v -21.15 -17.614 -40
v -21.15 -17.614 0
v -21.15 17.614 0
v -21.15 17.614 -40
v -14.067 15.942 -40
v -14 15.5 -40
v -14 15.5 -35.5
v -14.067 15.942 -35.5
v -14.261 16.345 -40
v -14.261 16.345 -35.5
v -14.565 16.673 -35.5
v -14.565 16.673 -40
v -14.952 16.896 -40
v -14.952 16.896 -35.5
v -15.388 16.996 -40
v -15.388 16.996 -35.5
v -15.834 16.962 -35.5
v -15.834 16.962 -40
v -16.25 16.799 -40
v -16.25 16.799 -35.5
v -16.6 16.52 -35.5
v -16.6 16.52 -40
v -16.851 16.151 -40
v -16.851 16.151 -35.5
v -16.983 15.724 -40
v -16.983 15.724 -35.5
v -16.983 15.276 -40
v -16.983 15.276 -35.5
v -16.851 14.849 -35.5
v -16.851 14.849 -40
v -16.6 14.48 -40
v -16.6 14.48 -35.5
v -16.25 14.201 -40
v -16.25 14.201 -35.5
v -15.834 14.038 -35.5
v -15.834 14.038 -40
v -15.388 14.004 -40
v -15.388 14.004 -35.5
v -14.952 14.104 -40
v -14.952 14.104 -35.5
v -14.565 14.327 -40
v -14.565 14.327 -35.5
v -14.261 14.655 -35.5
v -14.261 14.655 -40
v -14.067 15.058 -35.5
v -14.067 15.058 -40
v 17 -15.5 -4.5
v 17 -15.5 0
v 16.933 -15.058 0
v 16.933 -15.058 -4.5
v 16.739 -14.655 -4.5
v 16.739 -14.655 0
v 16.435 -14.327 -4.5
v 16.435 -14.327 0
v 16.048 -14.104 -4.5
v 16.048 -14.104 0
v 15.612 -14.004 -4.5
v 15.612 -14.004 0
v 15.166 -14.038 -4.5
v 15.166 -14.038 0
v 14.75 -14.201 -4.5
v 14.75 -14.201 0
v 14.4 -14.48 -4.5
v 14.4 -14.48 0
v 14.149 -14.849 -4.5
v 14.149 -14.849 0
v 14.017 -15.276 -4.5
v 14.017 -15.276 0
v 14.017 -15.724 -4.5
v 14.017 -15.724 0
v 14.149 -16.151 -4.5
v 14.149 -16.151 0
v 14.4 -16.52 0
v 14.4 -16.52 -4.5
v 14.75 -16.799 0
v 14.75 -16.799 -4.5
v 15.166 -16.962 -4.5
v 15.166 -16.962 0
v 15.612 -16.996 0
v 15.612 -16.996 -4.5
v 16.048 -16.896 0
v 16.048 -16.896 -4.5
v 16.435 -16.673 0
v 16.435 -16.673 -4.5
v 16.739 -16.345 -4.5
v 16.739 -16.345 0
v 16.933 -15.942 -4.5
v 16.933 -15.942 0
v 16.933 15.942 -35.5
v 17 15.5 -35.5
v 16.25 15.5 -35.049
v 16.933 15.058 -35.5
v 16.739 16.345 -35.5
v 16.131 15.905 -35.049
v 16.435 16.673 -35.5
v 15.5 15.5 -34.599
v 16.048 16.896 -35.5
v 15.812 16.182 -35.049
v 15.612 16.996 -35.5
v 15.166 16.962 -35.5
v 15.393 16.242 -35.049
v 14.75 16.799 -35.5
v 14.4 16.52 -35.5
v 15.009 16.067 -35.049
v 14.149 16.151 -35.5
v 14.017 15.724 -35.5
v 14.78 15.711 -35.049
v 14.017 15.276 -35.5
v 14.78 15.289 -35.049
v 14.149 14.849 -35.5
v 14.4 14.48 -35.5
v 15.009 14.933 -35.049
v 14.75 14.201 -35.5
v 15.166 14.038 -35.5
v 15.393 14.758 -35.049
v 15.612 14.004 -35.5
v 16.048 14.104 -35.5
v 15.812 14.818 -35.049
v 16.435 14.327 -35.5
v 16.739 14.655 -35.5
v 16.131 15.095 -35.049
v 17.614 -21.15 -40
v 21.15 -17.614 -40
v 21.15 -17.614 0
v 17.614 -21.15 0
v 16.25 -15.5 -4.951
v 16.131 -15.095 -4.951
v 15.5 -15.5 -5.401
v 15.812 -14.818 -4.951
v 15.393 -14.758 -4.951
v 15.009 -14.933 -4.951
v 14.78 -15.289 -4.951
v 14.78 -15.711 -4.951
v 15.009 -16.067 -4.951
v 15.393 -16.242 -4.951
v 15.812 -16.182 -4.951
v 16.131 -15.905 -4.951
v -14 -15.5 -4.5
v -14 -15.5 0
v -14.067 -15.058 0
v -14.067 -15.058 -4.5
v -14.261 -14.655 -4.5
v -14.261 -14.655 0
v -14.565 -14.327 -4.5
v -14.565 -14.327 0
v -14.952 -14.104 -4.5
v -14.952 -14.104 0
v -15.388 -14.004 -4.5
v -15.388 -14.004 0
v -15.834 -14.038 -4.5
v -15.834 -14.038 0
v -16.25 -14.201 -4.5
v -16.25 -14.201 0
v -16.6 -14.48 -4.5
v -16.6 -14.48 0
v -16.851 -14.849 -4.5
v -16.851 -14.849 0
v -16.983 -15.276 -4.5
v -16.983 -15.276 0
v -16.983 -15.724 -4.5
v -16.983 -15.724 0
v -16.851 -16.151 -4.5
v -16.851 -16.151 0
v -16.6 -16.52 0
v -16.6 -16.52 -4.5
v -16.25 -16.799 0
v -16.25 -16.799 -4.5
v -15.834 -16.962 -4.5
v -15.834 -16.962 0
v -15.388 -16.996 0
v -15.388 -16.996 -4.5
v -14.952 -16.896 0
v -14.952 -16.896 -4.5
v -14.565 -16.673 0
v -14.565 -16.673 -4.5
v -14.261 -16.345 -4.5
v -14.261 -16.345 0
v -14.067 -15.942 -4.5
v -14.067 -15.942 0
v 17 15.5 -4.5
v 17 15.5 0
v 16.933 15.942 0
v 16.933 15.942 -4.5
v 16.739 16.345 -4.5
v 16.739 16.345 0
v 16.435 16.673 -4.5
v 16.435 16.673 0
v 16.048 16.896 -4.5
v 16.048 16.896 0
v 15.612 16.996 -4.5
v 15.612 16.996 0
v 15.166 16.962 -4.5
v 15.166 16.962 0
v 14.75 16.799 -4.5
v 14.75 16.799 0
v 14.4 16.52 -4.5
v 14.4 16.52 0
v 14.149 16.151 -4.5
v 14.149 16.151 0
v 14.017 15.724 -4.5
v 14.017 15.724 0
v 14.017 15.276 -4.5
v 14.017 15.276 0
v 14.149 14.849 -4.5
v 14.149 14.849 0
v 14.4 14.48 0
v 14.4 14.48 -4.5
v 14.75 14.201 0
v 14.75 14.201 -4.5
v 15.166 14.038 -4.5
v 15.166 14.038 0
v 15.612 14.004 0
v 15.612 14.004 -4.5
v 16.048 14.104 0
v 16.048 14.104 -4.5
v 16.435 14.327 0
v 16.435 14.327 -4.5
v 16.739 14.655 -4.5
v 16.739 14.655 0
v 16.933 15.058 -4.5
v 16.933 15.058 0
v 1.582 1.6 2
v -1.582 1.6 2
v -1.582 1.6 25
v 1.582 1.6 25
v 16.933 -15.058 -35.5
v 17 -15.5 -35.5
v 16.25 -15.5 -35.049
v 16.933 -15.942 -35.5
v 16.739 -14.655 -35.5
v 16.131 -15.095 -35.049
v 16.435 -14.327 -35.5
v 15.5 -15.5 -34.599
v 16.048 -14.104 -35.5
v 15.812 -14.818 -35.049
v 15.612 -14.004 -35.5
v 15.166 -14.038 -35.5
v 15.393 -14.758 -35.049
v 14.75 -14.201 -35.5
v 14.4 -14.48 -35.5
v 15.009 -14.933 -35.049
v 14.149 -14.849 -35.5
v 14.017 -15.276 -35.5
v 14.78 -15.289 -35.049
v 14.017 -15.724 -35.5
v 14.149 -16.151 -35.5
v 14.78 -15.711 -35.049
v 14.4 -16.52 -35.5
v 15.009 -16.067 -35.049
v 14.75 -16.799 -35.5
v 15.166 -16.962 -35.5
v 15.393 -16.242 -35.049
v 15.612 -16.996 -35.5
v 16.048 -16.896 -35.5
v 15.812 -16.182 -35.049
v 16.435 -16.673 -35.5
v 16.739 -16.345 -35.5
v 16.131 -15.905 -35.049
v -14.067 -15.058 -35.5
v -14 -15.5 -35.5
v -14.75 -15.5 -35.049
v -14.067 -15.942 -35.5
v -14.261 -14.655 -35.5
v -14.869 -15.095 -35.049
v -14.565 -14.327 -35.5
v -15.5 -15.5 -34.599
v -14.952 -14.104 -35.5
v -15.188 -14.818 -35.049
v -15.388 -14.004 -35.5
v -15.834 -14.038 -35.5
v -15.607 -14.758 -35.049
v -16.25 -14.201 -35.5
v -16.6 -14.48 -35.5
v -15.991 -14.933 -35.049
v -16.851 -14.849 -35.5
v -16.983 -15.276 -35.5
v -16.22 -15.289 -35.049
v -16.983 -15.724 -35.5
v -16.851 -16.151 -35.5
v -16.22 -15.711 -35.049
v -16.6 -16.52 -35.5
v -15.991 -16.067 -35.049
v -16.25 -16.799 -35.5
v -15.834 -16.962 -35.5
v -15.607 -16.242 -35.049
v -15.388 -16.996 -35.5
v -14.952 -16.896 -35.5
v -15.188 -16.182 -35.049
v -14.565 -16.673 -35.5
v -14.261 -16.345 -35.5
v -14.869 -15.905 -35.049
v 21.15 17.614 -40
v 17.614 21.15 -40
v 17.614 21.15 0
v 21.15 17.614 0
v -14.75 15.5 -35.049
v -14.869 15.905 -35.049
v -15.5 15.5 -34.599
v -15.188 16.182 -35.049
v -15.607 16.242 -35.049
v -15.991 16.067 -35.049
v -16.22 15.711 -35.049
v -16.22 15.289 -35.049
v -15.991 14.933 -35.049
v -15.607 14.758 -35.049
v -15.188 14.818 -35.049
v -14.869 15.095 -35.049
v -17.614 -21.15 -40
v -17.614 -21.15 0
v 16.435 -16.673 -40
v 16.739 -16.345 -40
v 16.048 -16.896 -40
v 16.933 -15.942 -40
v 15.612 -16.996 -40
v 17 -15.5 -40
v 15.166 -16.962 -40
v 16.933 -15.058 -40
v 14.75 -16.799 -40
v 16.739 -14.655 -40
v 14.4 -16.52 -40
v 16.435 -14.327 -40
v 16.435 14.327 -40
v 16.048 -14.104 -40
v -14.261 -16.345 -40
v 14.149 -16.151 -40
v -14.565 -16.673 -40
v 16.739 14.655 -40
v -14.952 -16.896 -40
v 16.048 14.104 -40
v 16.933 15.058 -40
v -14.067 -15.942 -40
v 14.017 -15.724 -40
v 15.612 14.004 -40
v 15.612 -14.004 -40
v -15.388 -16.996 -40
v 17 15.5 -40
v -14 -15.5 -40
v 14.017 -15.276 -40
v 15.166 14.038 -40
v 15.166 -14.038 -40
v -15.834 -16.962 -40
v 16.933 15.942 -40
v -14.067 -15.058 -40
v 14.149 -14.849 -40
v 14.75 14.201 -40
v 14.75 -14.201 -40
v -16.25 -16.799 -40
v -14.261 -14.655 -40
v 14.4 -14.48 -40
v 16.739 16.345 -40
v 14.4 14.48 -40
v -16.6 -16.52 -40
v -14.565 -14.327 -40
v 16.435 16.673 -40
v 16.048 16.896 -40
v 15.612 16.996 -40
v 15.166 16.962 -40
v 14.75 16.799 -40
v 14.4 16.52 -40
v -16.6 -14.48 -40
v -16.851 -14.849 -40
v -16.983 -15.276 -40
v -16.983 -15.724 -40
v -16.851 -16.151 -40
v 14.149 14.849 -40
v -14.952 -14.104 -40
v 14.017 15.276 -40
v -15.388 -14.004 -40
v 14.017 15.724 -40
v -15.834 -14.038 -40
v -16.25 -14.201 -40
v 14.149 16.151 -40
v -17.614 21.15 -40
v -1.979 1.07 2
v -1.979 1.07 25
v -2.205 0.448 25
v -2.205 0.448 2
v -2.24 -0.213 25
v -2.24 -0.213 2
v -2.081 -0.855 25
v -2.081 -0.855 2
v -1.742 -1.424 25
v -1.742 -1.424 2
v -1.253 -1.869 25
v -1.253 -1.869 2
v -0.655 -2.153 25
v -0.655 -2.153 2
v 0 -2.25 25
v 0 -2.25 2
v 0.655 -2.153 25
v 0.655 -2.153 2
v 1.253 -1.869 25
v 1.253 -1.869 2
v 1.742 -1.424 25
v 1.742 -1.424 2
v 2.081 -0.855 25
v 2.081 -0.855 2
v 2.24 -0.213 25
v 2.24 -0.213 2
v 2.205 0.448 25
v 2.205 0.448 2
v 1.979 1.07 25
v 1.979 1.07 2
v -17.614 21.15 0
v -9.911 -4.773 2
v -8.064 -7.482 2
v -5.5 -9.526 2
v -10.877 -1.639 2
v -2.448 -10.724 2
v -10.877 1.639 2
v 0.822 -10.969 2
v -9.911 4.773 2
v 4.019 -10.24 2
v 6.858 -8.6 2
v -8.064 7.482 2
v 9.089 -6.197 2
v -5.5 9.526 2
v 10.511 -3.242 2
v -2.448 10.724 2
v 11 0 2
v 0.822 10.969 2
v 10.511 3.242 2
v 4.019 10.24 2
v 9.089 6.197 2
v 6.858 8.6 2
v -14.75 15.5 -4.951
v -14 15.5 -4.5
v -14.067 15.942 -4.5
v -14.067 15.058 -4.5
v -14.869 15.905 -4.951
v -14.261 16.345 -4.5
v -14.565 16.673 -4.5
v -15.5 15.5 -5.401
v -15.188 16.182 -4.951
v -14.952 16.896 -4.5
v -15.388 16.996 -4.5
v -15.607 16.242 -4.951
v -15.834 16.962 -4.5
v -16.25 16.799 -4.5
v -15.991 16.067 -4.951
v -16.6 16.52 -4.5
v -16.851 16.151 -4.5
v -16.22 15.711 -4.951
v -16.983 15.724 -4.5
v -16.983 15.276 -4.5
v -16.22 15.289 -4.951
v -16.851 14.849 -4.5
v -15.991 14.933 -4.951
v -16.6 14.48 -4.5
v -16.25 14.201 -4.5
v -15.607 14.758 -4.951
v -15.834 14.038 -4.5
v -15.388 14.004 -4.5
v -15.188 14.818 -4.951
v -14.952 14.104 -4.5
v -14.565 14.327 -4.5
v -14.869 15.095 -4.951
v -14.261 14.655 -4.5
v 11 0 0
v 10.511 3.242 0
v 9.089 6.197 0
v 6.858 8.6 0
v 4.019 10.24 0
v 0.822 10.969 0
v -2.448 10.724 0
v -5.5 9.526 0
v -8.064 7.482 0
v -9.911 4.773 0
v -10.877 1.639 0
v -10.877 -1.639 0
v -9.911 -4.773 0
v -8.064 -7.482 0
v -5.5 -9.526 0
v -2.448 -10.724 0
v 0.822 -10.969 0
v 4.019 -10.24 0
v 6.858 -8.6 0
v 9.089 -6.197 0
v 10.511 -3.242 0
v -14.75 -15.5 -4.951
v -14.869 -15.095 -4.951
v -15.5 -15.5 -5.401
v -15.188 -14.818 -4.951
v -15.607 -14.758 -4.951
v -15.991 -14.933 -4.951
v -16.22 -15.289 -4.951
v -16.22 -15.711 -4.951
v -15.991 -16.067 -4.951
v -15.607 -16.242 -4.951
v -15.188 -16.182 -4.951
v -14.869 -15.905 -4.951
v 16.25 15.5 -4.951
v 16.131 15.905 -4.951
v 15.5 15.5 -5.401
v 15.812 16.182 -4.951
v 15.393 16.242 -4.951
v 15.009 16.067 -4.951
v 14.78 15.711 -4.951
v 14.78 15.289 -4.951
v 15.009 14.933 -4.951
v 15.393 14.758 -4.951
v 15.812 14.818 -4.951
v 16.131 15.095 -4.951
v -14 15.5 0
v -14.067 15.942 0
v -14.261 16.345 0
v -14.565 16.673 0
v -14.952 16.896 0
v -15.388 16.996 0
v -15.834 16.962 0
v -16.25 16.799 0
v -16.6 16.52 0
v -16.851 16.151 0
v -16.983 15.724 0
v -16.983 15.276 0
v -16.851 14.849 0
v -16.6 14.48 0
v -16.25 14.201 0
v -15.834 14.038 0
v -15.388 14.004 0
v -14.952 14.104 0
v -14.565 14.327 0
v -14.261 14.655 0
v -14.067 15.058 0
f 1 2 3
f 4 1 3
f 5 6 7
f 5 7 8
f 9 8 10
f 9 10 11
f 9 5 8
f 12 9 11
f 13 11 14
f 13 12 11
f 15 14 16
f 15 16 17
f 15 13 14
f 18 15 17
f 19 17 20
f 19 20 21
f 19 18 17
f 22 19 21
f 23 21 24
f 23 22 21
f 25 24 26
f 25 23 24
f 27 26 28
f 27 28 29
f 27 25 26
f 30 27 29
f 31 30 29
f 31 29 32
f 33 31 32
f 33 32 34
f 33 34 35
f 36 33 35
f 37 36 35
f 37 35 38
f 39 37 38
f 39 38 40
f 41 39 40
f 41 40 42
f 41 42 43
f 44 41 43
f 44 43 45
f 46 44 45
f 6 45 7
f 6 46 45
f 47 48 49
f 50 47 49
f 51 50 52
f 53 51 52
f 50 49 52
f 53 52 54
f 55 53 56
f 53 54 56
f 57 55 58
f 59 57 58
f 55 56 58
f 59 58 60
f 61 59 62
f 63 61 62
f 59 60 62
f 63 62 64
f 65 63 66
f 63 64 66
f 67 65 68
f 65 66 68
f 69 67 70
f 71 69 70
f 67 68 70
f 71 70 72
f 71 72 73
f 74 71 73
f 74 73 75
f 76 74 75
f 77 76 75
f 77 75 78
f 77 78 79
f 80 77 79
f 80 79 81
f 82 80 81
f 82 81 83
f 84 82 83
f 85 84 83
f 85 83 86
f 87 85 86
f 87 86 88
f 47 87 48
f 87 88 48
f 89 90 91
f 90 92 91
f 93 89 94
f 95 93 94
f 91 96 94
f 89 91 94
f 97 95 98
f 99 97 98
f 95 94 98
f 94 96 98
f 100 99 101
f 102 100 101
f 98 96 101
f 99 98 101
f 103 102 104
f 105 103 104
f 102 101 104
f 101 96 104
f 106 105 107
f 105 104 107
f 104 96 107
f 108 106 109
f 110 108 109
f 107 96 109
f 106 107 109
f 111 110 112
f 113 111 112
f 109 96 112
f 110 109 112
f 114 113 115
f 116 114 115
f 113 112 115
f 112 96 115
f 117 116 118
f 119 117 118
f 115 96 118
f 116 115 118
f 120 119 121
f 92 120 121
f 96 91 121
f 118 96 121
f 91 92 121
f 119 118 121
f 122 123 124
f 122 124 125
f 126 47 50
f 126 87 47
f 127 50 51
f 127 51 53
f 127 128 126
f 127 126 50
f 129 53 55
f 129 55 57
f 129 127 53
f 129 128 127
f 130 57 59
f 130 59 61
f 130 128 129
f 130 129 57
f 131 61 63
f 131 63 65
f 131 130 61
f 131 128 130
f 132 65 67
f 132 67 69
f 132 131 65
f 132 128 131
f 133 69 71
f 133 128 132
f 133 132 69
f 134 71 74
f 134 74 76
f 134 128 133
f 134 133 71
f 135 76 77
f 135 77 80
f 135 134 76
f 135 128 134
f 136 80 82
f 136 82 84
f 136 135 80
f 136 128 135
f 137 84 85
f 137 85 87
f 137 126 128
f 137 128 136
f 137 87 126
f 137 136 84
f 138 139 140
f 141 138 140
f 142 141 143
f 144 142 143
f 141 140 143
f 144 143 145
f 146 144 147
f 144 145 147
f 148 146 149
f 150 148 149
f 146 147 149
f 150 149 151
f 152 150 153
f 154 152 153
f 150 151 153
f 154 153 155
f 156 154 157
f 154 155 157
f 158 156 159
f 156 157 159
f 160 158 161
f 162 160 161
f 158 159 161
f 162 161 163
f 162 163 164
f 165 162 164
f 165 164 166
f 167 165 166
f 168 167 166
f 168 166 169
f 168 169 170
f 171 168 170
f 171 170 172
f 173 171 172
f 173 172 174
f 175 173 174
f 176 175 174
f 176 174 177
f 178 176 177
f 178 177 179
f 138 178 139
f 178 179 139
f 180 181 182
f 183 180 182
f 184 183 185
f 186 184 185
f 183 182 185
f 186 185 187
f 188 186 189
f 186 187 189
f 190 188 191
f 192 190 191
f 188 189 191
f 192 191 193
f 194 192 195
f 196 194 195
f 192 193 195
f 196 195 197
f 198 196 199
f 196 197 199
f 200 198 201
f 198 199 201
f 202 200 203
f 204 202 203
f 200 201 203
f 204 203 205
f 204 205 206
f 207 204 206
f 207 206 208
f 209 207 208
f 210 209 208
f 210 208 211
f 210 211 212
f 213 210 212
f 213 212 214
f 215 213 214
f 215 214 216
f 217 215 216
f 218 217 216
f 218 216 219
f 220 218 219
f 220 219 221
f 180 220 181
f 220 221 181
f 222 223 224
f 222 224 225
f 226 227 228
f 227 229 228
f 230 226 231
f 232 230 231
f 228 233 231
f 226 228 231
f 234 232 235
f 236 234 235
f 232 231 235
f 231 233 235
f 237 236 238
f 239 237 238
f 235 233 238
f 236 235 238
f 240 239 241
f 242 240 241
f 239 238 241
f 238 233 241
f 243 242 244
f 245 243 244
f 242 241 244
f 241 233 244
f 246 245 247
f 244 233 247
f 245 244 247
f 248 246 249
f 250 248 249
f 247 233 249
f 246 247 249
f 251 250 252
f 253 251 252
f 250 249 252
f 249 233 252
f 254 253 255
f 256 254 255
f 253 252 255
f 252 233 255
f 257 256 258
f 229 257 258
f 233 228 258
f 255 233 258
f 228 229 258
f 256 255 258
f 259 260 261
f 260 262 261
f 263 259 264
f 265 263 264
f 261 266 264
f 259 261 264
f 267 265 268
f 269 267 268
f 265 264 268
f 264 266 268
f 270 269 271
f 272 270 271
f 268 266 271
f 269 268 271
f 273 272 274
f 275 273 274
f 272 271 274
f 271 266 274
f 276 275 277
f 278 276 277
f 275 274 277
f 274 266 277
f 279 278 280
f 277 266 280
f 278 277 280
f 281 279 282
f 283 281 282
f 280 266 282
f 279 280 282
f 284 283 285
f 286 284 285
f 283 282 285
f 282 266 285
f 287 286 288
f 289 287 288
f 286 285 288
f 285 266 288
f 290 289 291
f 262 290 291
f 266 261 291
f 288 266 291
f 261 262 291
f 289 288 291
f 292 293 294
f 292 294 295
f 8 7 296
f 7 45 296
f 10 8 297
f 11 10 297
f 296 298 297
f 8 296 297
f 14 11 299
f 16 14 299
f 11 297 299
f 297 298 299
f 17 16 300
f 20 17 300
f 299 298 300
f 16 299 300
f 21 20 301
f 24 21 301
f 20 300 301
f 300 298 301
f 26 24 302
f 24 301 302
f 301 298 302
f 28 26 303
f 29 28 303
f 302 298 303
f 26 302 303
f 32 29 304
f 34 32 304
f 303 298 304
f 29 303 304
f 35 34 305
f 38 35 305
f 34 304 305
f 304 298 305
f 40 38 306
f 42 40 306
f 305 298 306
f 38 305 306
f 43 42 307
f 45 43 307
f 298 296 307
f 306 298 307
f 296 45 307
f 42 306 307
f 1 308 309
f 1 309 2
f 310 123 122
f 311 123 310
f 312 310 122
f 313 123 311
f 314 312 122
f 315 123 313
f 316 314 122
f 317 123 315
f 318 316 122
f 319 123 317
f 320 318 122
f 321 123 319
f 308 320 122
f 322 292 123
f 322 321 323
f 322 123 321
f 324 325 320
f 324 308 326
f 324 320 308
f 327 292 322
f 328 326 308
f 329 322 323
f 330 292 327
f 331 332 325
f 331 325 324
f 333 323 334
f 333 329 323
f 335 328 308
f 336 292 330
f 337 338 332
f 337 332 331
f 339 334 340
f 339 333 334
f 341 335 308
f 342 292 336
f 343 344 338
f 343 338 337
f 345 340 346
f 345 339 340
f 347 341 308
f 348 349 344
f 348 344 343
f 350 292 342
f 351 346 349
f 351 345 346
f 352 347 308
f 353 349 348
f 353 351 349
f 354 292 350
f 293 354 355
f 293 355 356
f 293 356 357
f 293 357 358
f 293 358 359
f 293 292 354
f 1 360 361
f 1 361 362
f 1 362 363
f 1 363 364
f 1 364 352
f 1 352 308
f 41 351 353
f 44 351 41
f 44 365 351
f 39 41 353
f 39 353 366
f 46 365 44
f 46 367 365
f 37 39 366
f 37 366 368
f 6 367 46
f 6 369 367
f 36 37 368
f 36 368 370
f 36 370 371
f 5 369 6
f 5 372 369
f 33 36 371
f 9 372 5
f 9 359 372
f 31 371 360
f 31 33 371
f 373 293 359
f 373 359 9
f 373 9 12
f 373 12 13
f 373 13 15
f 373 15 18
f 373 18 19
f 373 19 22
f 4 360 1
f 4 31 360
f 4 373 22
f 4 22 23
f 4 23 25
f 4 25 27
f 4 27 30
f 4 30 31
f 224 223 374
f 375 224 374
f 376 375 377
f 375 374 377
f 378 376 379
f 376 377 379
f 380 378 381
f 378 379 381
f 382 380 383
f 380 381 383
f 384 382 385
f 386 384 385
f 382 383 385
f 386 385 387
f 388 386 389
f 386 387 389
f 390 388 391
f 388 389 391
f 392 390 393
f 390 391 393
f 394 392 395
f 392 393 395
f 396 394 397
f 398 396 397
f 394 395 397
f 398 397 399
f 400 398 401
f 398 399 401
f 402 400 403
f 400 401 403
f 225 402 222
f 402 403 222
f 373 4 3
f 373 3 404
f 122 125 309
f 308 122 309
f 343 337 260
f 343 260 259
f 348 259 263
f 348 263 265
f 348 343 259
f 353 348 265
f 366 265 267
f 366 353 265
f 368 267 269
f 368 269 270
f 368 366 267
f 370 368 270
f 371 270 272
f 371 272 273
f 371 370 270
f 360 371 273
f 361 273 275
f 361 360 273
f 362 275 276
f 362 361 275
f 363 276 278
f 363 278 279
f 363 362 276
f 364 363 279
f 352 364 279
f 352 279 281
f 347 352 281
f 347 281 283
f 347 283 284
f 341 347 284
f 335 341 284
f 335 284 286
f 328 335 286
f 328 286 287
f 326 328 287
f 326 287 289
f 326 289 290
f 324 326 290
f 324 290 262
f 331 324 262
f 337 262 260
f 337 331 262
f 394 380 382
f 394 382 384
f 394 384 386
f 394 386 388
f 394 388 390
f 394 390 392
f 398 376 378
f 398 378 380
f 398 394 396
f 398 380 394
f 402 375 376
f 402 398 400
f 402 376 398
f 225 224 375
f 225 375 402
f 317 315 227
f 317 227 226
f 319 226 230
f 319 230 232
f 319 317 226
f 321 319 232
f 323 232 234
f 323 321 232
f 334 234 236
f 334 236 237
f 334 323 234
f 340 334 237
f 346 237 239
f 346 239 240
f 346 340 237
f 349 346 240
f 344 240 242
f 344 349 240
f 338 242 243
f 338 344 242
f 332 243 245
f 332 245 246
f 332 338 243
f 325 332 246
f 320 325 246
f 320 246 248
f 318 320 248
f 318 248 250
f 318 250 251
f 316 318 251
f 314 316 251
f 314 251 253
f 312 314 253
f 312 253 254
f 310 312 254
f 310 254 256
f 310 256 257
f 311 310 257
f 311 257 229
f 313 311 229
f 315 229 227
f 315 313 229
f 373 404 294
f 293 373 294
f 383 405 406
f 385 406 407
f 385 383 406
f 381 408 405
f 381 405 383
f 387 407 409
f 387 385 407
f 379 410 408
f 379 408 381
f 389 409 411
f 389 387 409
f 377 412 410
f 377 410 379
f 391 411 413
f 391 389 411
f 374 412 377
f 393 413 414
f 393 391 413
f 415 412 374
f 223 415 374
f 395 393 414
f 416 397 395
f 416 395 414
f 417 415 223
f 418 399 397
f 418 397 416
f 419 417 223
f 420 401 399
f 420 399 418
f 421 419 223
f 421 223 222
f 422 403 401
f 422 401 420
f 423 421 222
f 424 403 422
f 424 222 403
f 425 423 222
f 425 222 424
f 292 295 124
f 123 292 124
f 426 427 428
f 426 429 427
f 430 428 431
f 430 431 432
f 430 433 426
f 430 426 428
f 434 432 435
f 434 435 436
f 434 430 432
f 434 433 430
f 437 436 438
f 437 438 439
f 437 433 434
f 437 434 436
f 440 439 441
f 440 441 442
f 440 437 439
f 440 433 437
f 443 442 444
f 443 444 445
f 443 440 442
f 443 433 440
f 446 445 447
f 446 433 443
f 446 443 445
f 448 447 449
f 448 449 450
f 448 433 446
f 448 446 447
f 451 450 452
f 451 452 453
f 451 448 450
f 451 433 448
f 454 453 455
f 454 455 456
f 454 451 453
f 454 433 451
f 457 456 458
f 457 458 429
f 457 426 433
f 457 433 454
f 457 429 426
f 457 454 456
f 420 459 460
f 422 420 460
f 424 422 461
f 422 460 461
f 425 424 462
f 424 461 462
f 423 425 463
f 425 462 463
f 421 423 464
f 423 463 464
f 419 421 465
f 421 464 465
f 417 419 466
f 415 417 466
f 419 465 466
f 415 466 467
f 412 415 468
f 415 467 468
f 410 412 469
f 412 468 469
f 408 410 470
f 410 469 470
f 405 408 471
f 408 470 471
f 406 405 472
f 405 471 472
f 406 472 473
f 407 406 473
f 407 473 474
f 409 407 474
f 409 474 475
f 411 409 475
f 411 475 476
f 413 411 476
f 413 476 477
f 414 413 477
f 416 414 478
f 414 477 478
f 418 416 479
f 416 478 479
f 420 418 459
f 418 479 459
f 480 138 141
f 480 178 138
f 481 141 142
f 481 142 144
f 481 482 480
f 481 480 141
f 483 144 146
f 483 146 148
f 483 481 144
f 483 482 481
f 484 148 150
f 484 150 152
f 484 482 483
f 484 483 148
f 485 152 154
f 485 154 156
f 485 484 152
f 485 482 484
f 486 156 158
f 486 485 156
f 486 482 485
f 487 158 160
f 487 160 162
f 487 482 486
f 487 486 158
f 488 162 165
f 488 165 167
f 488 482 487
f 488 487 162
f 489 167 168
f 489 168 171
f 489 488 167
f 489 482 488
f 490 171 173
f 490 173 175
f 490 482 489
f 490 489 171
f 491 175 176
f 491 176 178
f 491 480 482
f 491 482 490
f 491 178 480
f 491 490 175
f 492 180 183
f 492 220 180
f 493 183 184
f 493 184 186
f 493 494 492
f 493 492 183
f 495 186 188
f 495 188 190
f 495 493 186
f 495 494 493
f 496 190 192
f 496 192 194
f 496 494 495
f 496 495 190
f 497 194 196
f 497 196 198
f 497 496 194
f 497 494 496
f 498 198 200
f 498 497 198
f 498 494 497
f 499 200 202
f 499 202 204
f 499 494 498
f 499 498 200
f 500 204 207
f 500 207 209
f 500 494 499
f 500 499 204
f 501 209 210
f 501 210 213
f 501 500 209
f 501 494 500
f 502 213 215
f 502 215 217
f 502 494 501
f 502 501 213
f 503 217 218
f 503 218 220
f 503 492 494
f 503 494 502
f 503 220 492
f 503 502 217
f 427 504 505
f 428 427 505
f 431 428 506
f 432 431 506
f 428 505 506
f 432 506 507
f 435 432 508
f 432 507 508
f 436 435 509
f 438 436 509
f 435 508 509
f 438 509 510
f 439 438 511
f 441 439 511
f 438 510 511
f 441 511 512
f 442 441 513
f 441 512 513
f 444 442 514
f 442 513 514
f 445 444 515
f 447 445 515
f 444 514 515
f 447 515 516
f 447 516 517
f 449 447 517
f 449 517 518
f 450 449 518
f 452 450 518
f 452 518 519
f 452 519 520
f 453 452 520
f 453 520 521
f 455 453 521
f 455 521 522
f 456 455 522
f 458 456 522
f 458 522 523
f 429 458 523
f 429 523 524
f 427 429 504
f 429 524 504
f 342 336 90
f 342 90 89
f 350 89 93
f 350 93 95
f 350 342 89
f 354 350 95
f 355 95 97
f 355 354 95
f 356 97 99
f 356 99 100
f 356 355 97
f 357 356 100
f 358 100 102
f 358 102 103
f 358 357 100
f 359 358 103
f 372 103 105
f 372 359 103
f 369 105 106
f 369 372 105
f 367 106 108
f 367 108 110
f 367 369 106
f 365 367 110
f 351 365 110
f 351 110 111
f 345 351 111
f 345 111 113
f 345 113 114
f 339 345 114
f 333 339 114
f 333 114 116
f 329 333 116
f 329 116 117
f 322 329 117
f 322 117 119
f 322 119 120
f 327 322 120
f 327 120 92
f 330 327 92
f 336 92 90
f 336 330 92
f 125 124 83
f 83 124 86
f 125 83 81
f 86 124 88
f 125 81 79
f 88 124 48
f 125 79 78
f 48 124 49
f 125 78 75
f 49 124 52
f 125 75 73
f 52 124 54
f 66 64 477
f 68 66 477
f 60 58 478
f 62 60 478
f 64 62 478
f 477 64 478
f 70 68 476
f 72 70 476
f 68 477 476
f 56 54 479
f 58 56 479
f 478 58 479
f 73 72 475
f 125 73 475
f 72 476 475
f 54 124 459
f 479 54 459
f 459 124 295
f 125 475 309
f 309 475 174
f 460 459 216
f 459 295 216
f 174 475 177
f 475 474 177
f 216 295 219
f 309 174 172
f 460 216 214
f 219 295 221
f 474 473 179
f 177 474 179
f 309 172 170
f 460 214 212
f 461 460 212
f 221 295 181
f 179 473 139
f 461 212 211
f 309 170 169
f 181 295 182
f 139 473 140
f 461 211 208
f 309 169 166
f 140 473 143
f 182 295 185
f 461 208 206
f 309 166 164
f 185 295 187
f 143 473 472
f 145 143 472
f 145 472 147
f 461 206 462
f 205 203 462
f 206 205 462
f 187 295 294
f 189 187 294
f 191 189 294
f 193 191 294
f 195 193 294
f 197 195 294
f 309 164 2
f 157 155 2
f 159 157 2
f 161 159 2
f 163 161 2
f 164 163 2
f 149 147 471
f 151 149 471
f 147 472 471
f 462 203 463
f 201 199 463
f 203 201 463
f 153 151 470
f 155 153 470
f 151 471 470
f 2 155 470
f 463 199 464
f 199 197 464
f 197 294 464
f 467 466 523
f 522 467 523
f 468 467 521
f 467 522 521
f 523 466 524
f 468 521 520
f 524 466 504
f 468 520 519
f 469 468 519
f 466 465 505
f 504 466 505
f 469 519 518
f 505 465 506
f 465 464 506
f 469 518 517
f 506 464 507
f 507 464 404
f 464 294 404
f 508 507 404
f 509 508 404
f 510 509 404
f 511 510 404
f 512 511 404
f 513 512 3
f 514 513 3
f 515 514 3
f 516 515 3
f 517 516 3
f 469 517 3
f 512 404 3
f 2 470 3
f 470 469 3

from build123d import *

# Parameters (mm, degrees)
PAD002_DEPTH   = 40
SKETCH006_R    = 1.5
HOLE_DEPTH     = 4.5
HOLE_TIPS_R    = 1.5
SKETCH002_R    = 1.5
HOLE001_DEPTH  = 4.5
HOLE001_TIPS_R = 1.5
SKETCH007_R    = 11
PAD003_DEPTH   = 2
PAD004_DEPTH   = 23


with BuildPart() as part:
    # Sketch005 → Pad002 (new body)
    with BuildSketch(Plane.XY):
        Polygon((-17.614466, 21.15), (17.614466, 21.15), (21.15, 17.614466), (21.15, -17.614466), (17.614466, -21.15), (-17.614466, -21.15), (-21.15, -17.614466), (-21.15, 17.614466), align=None)
    extrude(amount=PAD002_DEPTH)

    # Sketch006 (on Face10 of Pad002) → Hole (cut)
    with BuildSketch(Plane.XY.offset(40)):
        with Locations((15.5, 15.5)):
            Circle(SKETCH006_R)
        with Locations((-15.5, 15.5)):
            Circle(SKETCH006_R)
        with Locations((-15.5, -15.5)):
            Circle(SKETCH006_R)
        with Locations((15.5, -15.5)):
            Circle(SKETCH006_R)
    extrude(amount=-HOLE_DEPTH, mode=Mode.SUBTRACT)

    # Hole tips → Hole tip 1 section 0
    with BuildSketch(Plane.XY.offset(35.5), mode=Mode.PRIVATE) as hole_tip_1_s0:
        with Locations((15.5, 15.5)):
            Circle(HOLE_TIPS_R)
    loft([hole_tip_1_s0.sketch, Vertex(15.5, 15.5, 34.598709)], mode=Mode.SUBTRACT)

    # Hole tips → Hole tip 2 section 0
    with BuildSketch(Plane.XY.offset(35.5), mode=Mode.PRIVATE) as hole_tip_2_s0:
        with Locations((-15.5, 15.5)):
            Circle(HOLE_TIPS_R)
    loft([hole_tip_2_s0.sketch, Vertex(-15.5, 15.5, 34.598709)], mode=Mode.SUBTRACT)

    # Hole tips → Hole tip 3 section 0
    with BuildSketch(Plane.XY.offset(35.5), mode=Mode.PRIVATE) as hole_tip_3_s0:
        with Locations((-15.5, -15.5)):
            Circle(HOLE_TIPS_R)
    loft([hole_tip_3_s0.sketch, Vertex(-15.5, -15.5, 34.598709)], mode=Mode.SUBTRACT)

    # Hole tips → Hole tip 4 section 0
    with BuildSketch(Plane.XY.offset(35.5), mode=Mode.PRIVATE) as hole_tip_4_s0:
        with Locations((15.5, -15.5)):
            Circle(HOLE_TIPS_R)
    loft([hole_tip_4_s0.sketch, Vertex(15.5, -15.5, 34.598709)], mode=Mode.SUBTRACT)

    # Sketch002 → Hole001 (cut)
    with BuildSketch(Plane.XY):
        with Locations((-15.5, 15.5)):
            Circle(SKETCH002_R)
        with Locations((-15.5, -15.5)):
            Circle(SKETCH002_R)
        with Locations((15.5, -15.5)):
            Circle(SKETCH002_R)
        with Locations((15.5, 15.5)):
            Circle(SKETCH002_R)
    extrude(amount=HOLE001_DEPTH, mode=Mode.SUBTRACT)

    # Hole001 tips → Hole001 tip 1 section 0
    with BuildSketch(Plane.XY.offset(4.5), mode=Mode.PRIVATE) as hole001_tip_1_s0:
        with Locations((-15.5, 15.5)):
            Circle(HOLE001_TIPS_R)
    loft([hole001_tip_1_s0.sketch, Vertex(-15.5, 15.5, 5.401291)], mode=Mode.SUBTRACT)

    # Hole001 tips → Hole001 tip 2 section 0
    with BuildSketch(Plane.XY.offset(4.5), mode=Mode.PRIVATE) as hole001_tip_2_s0:
        with Locations((-15.5, -15.5)):
            Circle(HOLE001_TIPS_R)
    loft([hole001_tip_2_s0.sketch, Vertex(-15.5, -15.5, 5.401291)], mode=Mode.SUBTRACT)

    # Hole001 tips → Hole001 tip 3 section 0
    with BuildSketch(Plane.XY.offset(4.5), mode=Mode.PRIVATE) as hole001_tip_3_s0:
        with Locations((15.5, -15.5)):
            Circle(HOLE001_TIPS_R)
    loft([hole001_tip_3_s0.sketch, Vertex(15.5, -15.5, 5.401291)], mode=Mode.SUBTRACT)

    # Hole001 tips → Hole001 tip 4 section 0
    with BuildSketch(Plane.XY.offset(4.5), mode=Mode.PRIVATE) as hole001_tip_4_s0:
        with Locations((15.5, 15.5)):
            Circle(HOLE001_TIPS_R)
    loft([hole001_tip_4_s0.sketch, Vertex(15.5, 15.5, 5.401291)], mode=Mode.SUBTRACT)

    # Sketch007 (on Face5 of Hole001) → Pad003 (join)
    with BuildSketch(Plane.XY.offset(40)):
        Circle(SKETCH007_R)
    extrude(amount=PAD003_DEPTH)

    # Sketch008 (on Face27 of Pad003) → Pad004 (join)
    with BuildSketch(Plane.XY.offset(42)):
        with BuildLine():
            ThreePointArc((-1.581929, 1.6), (0, -2.25), (1.581929, 1.6))
            Line((-1.581929, 1.6), (1.581929, 1.6))
        make_face()
    extrude(amount=PAD004_DEPTH)


with BuildPart() as part_1:
    # Body001 placement: moved
    add(part.part.moved(Location((0, 0, -40))))


solid = part_1.part
